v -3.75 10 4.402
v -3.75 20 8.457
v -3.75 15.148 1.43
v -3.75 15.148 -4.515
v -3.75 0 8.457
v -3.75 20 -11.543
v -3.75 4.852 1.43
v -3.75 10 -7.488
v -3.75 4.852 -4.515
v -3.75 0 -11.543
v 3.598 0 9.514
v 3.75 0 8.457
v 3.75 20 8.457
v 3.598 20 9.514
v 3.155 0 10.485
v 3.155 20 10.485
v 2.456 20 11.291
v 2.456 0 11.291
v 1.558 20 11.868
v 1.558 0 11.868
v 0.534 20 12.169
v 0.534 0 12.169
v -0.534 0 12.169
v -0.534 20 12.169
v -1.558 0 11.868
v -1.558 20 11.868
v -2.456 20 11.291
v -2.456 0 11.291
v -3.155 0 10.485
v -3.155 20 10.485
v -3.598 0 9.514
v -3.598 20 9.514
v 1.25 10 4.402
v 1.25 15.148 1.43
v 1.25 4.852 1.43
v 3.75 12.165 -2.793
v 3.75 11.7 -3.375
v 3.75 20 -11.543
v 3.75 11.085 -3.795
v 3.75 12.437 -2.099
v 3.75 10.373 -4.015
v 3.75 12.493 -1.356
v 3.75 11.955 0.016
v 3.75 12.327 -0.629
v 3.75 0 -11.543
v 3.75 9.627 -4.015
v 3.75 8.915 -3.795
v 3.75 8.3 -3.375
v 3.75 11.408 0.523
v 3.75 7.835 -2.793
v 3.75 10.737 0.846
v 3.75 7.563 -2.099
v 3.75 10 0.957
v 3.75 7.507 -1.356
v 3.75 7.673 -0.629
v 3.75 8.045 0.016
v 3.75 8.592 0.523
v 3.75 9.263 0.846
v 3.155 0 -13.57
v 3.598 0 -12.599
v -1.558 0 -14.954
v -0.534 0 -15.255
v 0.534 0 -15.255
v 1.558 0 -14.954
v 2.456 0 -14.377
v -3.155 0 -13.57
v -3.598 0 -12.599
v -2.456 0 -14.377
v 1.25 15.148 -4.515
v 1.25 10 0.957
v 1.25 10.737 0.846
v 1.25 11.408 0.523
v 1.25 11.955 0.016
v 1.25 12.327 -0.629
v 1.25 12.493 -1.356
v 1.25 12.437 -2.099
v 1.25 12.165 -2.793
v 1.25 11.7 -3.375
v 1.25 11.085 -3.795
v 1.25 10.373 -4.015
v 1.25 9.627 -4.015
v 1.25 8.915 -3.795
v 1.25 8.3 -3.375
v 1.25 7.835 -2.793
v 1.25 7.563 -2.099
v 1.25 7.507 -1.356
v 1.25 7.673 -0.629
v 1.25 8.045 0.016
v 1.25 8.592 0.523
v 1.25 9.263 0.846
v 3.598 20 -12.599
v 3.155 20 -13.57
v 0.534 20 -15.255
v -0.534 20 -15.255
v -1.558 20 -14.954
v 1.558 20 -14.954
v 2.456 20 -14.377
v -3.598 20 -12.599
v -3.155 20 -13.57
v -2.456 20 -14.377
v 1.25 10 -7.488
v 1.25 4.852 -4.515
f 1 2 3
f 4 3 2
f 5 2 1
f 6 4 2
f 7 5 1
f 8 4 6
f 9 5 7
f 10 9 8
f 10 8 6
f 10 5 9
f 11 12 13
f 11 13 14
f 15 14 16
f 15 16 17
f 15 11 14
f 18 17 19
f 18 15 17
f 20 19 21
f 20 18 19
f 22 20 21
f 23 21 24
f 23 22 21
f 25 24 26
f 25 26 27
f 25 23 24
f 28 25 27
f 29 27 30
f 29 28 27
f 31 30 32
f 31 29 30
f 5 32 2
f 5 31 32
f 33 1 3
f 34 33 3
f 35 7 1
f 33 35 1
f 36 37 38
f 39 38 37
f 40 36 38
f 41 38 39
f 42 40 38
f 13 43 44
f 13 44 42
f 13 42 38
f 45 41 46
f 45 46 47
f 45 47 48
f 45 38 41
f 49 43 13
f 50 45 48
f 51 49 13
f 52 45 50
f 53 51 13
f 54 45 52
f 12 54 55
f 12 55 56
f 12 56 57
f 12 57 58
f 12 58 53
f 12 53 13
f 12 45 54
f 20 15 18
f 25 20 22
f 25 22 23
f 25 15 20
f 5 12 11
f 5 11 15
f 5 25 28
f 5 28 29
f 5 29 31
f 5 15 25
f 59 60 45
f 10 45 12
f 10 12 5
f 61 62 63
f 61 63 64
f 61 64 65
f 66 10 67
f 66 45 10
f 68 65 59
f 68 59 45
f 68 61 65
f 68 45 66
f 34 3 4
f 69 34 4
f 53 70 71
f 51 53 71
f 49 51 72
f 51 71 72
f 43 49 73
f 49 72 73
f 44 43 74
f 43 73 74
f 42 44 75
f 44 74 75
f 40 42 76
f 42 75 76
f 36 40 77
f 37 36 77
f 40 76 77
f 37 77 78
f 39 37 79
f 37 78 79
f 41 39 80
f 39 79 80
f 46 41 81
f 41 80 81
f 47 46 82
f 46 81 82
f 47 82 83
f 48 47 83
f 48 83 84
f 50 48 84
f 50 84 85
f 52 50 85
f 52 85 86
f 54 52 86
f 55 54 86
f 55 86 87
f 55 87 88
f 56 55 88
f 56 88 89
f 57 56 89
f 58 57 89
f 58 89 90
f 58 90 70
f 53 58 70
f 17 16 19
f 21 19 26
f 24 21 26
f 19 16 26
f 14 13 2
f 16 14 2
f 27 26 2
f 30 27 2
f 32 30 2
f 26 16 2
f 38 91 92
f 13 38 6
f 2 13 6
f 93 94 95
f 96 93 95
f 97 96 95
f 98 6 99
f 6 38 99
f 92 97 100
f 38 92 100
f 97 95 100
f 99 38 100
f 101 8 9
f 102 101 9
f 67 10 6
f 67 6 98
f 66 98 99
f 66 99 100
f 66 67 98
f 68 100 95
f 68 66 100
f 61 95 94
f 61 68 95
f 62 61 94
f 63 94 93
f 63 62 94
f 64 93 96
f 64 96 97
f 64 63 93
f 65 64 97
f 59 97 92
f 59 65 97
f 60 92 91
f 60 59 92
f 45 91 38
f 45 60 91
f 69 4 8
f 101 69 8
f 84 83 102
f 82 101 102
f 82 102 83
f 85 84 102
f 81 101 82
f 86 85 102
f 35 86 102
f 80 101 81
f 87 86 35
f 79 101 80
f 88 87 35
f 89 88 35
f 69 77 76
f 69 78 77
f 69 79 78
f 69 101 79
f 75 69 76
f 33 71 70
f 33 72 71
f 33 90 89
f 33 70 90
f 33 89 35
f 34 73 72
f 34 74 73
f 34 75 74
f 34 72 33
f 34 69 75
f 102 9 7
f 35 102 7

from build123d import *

# Parameters (mm, degrees)
BOSS_EXTRUDE1_DEPTH = 20
SKETCH2_R           = 2.5
CUT_EXTRUDE1_DEPTH  = 20
SKETCH2_4_R         = 2.5
CUT_EXTRUDE2_DEPTH  = 5


with BuildPart() as part:
    # Sketch1 → Boss-Extrude1 (new body)
    with BuildSketch(Plane(origin=(0, 0, 0), x_dir=(1, 0, 0), z_dir=(0, 1, 0))):
        with BuildLine():
            Line((-3.75, -8.45729612), (-3.75, 11.54270388))
            ThreePointArc((-3.75, 11.54270388), (0, 15.29270388), (3.75, 11.54270388))
            Line((3.75, 11.54270388), (3.75, -8.45729612))
            ThreePointArc((3.75, -8.45729612), (0, -12.20729612), (-3.75, -8.45729612))
        make_face()
    extrude(amount=BOSS_EXTRUDE1_DEPTH)

    # Sketch2 → Cut-Extrude1 (cut)
    with BuildSketch(Plane.ZY.offset(3.75)):
        with Locations((-1.54270388, 10)):
            Circle(SKETCH2_R)
    extrude(amount=-CUT_EXTRUDE1_DEPTH, mode=Mode.SUBTRACT)

    # Sketch2<4> → Cut-Extrude2 (cut)
    with BuildSketch(Plane.ZY.offset(3.75)):
        Polygon((4.402095487, 10), (1.429695804, 15.148347272), (-4.515103563, 15.148347272), (-7.487503247, 10), (-4.515103563, 4.851652728), (1.429695804, 4.851652728), align=None)
        with Locations((-1.54270388, 10)):
            Circle(SKETCH2_4_R, mode=Mode.SUBTRACT)
    extrude(amount=-CUT_EXTRUDE2_DEPTH, mode=Mode.SUBTRACT)


solid = part.part
